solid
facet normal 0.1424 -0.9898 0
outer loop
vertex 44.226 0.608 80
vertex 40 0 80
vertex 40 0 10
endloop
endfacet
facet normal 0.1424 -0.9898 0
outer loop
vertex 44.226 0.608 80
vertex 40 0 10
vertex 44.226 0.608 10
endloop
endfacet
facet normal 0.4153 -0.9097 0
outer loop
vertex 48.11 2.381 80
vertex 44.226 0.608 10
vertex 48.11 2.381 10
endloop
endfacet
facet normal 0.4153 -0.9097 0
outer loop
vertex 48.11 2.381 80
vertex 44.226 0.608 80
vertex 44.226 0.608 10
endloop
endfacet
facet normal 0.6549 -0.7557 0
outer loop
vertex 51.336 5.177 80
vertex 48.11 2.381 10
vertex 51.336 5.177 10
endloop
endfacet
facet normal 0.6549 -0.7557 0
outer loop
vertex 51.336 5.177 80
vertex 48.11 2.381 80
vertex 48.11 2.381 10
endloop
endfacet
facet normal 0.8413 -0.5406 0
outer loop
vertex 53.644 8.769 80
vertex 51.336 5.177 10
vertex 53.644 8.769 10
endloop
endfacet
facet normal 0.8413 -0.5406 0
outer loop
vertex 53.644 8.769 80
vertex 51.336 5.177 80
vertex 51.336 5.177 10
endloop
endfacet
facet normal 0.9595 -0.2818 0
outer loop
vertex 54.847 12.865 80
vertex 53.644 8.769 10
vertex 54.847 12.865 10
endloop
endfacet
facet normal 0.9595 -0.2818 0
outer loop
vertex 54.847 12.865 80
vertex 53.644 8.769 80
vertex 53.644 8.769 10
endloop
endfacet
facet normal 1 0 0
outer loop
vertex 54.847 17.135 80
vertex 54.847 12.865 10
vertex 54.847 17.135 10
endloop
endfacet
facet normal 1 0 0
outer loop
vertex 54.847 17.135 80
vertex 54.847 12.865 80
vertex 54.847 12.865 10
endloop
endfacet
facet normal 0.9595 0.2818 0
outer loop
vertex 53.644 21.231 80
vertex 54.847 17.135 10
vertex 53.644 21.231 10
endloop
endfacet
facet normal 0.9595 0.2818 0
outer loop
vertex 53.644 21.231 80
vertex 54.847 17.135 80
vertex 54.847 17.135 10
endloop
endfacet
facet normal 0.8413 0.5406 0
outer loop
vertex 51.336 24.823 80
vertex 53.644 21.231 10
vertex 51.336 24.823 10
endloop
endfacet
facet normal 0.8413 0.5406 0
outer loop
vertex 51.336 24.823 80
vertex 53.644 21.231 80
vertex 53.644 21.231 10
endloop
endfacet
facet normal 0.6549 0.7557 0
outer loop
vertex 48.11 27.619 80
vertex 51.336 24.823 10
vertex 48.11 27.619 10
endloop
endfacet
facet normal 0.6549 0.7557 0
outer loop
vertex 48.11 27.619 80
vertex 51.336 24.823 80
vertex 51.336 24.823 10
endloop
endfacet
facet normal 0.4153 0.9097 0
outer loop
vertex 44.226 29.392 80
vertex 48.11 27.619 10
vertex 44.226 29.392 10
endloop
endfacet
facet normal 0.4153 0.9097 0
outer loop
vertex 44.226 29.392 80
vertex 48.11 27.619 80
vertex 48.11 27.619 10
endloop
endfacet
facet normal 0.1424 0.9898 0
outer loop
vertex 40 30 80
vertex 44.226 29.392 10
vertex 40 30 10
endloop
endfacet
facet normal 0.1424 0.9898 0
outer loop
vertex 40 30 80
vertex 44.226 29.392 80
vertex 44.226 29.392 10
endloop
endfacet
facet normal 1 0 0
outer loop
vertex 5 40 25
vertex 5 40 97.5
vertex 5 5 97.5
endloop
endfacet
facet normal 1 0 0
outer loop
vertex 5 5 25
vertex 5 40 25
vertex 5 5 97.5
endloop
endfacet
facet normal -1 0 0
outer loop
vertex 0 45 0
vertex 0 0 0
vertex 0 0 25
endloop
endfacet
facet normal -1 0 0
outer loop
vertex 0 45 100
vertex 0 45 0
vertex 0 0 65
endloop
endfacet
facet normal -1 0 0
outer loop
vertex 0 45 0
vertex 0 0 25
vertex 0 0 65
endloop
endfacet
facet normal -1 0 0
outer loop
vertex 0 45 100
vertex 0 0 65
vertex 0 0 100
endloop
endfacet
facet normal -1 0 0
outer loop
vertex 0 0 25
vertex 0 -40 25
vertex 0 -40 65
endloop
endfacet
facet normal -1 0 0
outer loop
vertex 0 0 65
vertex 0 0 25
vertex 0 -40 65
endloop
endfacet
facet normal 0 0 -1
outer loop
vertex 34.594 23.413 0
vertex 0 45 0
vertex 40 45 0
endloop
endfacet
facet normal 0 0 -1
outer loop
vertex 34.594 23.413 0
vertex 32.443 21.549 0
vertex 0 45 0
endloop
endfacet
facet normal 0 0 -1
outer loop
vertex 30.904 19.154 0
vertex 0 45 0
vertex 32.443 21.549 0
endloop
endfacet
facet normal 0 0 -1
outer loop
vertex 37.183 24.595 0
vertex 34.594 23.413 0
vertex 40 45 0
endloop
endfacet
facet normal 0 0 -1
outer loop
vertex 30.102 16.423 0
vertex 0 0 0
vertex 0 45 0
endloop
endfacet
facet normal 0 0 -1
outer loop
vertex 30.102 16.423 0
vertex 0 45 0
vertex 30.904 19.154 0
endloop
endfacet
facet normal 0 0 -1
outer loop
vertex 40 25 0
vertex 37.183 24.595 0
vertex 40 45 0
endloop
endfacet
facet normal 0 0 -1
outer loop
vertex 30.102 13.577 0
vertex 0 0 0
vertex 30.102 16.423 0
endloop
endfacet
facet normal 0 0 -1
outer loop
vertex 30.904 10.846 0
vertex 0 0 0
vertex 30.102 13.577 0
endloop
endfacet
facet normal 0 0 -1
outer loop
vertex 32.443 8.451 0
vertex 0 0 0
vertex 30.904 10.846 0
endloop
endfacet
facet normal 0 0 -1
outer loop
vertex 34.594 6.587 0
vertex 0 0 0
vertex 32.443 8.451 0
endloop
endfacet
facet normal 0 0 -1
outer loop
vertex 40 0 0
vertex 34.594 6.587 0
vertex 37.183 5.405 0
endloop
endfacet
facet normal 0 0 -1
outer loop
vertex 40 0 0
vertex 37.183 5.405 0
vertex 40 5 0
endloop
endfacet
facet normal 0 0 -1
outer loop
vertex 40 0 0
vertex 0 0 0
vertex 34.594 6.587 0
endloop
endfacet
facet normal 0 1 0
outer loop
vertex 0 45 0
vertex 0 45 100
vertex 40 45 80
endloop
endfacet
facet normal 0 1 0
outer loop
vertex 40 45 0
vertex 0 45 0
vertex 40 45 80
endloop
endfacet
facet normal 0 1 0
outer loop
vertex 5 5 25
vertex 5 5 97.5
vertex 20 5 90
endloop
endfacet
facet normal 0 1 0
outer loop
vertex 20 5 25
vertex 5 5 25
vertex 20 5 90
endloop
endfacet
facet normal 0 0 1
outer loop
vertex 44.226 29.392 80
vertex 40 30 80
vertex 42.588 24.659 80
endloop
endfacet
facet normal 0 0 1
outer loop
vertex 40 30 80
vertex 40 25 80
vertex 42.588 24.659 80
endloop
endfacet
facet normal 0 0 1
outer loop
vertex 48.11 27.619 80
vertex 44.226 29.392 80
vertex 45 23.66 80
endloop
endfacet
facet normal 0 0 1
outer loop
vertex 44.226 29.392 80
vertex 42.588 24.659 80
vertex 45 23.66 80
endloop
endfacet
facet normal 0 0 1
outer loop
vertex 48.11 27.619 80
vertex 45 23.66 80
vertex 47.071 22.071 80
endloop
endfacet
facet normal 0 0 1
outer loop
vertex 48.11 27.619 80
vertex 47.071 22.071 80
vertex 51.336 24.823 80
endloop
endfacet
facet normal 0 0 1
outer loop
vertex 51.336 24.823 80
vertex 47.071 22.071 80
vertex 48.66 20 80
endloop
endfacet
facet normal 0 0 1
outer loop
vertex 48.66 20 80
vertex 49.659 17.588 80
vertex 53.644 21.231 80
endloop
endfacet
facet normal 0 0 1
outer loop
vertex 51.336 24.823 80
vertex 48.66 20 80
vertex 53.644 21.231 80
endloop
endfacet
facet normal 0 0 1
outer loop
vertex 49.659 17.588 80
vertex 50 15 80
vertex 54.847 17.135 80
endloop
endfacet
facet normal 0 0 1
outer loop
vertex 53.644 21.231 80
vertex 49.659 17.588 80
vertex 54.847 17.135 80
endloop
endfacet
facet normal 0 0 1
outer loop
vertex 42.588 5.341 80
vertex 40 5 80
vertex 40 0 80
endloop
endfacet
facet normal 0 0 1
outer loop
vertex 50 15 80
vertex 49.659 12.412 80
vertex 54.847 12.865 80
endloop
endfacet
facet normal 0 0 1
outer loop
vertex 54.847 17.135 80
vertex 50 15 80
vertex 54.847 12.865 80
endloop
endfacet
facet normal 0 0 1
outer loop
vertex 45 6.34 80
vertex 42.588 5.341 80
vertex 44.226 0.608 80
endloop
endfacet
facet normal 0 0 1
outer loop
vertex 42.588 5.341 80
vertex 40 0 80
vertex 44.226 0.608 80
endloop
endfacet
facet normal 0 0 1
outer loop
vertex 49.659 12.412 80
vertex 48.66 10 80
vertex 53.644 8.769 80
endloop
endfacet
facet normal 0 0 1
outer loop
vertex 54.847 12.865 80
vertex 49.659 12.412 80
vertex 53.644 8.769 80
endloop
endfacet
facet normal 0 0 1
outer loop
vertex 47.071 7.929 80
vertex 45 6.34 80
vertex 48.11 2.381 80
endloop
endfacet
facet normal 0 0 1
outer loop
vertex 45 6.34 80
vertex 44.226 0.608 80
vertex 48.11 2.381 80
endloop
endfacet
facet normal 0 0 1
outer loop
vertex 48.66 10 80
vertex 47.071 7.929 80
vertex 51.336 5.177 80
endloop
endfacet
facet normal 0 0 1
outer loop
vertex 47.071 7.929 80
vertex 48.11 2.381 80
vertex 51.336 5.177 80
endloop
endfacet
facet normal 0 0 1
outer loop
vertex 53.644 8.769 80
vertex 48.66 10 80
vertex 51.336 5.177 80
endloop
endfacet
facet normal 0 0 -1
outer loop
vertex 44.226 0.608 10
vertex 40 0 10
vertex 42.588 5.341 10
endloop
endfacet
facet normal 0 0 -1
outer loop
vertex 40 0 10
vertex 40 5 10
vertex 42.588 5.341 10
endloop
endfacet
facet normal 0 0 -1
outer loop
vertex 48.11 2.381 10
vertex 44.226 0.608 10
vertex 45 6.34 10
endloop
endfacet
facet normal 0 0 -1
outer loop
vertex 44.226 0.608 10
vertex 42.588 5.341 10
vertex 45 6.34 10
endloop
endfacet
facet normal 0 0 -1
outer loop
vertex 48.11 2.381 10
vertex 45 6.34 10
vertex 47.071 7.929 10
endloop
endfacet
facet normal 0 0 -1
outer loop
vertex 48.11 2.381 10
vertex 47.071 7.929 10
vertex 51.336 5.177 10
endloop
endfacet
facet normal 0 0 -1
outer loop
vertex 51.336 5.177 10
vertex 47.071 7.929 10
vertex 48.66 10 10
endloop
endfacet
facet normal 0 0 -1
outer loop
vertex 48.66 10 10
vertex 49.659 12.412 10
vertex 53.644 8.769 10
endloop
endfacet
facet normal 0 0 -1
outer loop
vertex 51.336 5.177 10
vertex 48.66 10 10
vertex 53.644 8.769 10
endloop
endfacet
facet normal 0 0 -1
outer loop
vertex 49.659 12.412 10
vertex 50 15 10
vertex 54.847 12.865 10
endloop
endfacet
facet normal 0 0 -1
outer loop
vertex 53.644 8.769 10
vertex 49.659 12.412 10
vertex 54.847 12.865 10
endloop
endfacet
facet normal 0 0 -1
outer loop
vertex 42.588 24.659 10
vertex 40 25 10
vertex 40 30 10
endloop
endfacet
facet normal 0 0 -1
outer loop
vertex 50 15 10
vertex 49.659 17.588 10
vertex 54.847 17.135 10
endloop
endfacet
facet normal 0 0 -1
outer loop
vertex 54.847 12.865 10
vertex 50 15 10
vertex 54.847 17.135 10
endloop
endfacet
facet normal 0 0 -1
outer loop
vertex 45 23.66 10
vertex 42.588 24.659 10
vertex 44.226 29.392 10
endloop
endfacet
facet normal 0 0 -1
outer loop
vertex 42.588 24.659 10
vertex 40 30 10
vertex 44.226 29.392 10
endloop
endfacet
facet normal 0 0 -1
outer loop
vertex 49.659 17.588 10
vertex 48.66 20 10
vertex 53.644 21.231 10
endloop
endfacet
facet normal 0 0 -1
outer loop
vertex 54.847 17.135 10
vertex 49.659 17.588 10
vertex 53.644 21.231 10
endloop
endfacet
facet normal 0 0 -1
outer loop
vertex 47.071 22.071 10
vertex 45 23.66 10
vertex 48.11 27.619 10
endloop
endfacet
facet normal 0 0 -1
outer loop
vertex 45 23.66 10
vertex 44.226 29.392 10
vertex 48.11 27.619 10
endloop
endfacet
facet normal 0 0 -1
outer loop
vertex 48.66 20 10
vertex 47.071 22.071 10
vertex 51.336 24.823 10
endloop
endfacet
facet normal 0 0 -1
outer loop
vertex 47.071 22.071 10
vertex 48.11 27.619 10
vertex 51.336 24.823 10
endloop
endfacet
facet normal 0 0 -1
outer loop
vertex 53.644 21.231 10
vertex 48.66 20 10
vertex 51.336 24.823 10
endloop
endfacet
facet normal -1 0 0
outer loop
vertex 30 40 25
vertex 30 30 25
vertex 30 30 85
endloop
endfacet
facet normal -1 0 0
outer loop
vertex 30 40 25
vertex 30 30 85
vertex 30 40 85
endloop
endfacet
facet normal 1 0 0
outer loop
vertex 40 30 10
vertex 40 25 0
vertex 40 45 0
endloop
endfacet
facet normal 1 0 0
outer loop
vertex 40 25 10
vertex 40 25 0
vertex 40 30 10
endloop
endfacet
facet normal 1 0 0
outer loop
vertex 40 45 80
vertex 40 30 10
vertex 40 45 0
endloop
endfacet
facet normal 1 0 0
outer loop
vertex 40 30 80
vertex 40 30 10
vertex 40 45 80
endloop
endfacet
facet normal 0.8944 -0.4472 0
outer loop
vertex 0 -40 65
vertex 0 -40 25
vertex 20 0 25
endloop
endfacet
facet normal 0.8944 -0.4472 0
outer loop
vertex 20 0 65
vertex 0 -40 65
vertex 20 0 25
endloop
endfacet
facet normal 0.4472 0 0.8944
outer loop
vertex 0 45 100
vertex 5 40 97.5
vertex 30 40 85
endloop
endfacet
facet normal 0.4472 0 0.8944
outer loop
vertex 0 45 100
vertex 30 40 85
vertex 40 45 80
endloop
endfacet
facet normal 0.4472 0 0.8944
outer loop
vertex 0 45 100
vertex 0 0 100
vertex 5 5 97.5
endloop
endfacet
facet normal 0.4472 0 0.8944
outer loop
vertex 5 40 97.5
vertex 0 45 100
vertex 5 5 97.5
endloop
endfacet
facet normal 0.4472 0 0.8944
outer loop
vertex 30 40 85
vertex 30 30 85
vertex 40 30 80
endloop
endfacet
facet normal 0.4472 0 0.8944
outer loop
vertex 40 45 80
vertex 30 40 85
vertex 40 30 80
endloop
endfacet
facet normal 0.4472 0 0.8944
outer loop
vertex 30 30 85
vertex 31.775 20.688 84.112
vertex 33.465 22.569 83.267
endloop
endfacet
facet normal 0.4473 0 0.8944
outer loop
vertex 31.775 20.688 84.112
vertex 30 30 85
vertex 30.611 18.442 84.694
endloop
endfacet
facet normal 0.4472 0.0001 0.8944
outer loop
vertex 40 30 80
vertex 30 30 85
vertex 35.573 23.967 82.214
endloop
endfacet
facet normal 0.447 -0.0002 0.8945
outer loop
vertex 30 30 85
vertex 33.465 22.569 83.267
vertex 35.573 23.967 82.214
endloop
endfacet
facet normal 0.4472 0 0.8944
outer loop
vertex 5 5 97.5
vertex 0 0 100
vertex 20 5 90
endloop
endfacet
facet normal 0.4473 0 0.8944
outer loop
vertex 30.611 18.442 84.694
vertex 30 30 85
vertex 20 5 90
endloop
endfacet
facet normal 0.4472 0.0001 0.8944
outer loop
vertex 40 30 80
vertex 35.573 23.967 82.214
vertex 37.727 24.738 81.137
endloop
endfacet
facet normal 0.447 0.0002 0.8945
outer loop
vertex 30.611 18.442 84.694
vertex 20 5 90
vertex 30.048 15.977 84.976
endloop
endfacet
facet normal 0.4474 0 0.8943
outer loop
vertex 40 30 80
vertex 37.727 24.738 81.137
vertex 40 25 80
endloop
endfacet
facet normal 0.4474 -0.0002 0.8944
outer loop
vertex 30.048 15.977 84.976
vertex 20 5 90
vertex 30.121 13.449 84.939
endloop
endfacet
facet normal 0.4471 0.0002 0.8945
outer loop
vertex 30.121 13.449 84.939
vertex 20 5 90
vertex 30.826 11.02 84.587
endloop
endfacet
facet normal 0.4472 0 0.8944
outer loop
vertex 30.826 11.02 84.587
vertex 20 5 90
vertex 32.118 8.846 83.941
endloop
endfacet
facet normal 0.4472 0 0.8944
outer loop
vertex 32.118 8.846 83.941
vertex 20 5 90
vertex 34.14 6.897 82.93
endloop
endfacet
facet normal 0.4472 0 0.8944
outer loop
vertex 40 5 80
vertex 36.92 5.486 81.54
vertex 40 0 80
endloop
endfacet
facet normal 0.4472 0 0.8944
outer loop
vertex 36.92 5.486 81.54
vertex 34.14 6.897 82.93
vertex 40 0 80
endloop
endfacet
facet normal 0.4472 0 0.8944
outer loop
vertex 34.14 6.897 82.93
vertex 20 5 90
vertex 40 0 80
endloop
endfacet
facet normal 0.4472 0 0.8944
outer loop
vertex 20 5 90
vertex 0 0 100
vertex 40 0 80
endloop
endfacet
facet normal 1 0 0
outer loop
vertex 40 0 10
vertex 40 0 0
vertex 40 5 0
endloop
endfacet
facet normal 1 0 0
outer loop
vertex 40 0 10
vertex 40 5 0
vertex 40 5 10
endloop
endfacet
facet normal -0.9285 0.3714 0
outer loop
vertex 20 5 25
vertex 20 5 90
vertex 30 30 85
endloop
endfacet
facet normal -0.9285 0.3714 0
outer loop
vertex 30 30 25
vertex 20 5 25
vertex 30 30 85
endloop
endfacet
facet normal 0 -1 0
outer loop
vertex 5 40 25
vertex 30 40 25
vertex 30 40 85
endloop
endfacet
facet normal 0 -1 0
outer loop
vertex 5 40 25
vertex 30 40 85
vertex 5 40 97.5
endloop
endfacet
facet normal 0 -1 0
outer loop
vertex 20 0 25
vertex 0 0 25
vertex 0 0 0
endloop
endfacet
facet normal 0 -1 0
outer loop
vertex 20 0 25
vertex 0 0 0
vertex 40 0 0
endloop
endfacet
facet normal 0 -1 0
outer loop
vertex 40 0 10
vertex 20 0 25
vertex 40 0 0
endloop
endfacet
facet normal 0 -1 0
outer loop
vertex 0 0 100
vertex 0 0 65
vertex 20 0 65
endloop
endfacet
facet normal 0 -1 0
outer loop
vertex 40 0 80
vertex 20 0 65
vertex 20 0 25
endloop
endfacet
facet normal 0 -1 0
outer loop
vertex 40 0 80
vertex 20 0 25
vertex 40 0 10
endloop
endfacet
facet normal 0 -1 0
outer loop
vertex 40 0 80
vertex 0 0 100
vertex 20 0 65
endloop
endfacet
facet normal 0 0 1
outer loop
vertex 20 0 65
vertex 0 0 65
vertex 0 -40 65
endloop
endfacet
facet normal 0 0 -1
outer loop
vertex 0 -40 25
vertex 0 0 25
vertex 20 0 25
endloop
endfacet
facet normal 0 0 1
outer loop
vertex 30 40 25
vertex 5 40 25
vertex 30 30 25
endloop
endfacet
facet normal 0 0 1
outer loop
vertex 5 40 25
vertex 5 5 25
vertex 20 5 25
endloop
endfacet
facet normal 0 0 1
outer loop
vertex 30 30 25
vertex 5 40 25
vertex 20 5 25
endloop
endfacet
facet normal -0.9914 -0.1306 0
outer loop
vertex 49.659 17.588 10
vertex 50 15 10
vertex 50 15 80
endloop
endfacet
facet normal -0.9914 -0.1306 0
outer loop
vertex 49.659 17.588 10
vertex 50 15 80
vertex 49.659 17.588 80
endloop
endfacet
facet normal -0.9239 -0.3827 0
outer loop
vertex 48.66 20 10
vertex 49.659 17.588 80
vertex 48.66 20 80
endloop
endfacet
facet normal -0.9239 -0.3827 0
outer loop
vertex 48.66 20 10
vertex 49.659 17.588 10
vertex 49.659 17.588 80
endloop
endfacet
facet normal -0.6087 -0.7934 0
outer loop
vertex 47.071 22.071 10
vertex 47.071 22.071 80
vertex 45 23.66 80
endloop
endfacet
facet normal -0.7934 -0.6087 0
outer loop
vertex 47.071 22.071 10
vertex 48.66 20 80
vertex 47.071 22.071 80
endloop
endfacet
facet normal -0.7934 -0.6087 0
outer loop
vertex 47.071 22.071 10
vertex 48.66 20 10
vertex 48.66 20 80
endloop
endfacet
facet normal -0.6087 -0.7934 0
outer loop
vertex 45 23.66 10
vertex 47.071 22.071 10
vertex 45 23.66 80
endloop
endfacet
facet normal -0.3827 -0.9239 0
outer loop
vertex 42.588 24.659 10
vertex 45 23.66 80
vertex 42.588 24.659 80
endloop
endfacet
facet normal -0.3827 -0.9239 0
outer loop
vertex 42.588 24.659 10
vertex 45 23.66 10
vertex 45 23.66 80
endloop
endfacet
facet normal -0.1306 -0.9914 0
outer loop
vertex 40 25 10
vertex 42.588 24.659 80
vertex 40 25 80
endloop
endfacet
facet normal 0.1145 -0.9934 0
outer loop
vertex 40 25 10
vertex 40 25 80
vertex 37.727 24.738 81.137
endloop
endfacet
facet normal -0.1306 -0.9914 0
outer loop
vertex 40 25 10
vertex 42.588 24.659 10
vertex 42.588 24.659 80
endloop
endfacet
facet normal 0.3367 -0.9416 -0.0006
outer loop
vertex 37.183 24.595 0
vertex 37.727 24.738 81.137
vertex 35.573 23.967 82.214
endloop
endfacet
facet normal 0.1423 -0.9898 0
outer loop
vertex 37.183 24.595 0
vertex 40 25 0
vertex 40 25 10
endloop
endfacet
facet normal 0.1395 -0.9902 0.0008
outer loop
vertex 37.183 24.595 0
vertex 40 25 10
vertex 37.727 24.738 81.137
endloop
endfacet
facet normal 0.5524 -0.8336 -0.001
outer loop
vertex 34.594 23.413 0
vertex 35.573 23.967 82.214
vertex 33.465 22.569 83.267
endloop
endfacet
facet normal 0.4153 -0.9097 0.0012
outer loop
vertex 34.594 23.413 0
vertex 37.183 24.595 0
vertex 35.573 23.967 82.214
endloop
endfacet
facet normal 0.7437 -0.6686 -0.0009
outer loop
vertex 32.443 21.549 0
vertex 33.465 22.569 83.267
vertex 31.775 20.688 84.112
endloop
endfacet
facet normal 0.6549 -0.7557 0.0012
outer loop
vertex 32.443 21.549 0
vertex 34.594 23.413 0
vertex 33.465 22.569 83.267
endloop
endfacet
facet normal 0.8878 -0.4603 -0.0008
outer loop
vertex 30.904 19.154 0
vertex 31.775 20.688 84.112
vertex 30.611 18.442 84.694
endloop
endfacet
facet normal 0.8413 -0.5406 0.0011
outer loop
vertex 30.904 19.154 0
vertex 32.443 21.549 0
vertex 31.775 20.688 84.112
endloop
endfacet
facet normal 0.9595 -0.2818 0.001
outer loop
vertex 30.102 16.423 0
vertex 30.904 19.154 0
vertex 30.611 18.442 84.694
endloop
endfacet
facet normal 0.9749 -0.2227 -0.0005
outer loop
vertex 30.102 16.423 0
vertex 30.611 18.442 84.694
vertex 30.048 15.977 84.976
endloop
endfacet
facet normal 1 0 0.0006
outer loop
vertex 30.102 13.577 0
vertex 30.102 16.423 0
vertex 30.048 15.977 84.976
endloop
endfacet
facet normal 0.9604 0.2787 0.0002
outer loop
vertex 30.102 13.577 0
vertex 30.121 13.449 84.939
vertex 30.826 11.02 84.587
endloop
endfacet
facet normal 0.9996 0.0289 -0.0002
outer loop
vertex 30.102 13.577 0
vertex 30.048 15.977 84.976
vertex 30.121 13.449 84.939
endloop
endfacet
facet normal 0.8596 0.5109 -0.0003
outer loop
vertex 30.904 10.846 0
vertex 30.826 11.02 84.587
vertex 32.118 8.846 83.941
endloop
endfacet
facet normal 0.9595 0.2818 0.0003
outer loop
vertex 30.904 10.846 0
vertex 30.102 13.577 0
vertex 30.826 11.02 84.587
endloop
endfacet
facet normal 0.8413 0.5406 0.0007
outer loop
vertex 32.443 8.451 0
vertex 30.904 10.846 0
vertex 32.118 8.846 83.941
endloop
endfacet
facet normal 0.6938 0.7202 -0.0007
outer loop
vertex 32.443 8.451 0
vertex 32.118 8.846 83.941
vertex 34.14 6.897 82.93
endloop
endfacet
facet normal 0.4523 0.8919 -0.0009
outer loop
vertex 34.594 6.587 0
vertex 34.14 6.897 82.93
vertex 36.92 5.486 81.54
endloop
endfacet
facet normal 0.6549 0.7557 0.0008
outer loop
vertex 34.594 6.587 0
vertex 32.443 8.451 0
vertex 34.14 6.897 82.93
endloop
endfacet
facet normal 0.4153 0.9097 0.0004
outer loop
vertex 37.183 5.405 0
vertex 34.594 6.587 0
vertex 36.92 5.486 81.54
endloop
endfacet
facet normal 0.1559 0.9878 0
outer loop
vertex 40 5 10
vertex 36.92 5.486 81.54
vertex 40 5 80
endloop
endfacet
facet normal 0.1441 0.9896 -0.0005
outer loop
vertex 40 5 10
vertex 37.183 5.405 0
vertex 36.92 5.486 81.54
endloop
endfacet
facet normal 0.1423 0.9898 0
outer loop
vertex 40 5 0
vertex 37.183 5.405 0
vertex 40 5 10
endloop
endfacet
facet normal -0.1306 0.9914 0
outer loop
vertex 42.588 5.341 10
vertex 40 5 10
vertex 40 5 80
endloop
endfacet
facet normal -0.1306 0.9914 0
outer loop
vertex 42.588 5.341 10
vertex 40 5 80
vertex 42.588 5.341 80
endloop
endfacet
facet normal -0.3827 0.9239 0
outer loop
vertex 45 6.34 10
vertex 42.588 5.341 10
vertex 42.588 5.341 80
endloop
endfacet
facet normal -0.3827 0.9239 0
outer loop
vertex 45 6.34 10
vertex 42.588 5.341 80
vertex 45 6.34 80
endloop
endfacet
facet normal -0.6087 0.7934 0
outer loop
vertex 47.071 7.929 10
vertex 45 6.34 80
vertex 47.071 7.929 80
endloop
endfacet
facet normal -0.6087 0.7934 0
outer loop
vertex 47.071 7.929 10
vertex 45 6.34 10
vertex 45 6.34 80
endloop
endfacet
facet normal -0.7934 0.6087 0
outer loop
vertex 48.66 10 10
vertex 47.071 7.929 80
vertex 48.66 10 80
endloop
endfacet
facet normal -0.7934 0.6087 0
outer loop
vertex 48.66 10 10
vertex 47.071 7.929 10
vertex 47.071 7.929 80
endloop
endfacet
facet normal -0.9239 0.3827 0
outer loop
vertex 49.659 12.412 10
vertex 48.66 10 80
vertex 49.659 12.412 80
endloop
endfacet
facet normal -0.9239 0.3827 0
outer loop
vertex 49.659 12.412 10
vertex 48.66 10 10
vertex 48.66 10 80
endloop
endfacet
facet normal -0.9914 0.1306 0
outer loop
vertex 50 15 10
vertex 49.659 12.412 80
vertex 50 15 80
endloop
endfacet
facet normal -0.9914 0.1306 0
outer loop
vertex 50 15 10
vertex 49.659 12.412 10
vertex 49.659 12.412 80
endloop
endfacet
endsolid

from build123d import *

# Parameters (mm, degrees)
F0_W      = 40
F0_H      = 100
F1_DEPTH  = 45
F2_R      = 15
F3_DEPTH  = 90
F5_DEPTH  = 45.001
F7_DEPTH  = 100.001
F9_DEPTH  = 25
F10_R     = 10
F11_DEPTH = 100.001
F14_DEPTH = 40


with BuildPart() as f1:
    # F0 (on Front) → F1 (new body)
    with BuildSketch(Plane.XZ):
        with Locations((20, 50)):
            Rectangle(F0_W, F0_H)
    extrude(amount=-F1_DEPTH)

    # F2 (on face) → F3 (join)
    with BuildSketch(Plane.XY.offset(100)):
        with Locations((40, 15)):
            Circle(F2_R)
    extrude(amount=-F3_DEPTH)

    # F4 (on face) → F5 (cut, through all)
    with BuildSketch(Plane.XZ):
        Polygon((62.4297, 100), (0, 100), (40, 80), (62.4297, 80), align=None)
    extrude(amount=-F5_DEPTH, mode=Mode.SUBTRACT)

    # F6 (on Top) → F7 (cut, through all)
    with BuildSketch(Plane.XY):
        Polygon((30, 40), (5, 40), (5, 5), (20, 5), (30, 30), align=None)
    extrude(amount=F7_DEPTH, mode=Mode.SUBTRACT)

    # F8 (on face) → F9 (join)
    with BuildSketch(Plane(origin=(0, 0, 0), x_dir=(1, 0, 0), z_dir=(0, 0, -1))):
        Polygon((5, -5), (5, -40), (30, -40), (30, -30), (20, -5), align=None)
    extrude(amount=-F9_DEPTH)

    # F10 (on Top) → F11 (cut, through all)
    with BuildSketch(Plane.XY):
        with Locations((40, 15)):
            Circle(F10_R)
    extrude(amount=F11_DEPTH, mode=Mode.SUBTRACT)

    # F13 (on offset) → F14 (join)
    with BuildSketch(Plane.XY.offset(25)):
        Polygon((20, 0), (0, 0), (0, -40), align=None)
    extrude(amount=F14_DEPTH)


solid = f1.part
